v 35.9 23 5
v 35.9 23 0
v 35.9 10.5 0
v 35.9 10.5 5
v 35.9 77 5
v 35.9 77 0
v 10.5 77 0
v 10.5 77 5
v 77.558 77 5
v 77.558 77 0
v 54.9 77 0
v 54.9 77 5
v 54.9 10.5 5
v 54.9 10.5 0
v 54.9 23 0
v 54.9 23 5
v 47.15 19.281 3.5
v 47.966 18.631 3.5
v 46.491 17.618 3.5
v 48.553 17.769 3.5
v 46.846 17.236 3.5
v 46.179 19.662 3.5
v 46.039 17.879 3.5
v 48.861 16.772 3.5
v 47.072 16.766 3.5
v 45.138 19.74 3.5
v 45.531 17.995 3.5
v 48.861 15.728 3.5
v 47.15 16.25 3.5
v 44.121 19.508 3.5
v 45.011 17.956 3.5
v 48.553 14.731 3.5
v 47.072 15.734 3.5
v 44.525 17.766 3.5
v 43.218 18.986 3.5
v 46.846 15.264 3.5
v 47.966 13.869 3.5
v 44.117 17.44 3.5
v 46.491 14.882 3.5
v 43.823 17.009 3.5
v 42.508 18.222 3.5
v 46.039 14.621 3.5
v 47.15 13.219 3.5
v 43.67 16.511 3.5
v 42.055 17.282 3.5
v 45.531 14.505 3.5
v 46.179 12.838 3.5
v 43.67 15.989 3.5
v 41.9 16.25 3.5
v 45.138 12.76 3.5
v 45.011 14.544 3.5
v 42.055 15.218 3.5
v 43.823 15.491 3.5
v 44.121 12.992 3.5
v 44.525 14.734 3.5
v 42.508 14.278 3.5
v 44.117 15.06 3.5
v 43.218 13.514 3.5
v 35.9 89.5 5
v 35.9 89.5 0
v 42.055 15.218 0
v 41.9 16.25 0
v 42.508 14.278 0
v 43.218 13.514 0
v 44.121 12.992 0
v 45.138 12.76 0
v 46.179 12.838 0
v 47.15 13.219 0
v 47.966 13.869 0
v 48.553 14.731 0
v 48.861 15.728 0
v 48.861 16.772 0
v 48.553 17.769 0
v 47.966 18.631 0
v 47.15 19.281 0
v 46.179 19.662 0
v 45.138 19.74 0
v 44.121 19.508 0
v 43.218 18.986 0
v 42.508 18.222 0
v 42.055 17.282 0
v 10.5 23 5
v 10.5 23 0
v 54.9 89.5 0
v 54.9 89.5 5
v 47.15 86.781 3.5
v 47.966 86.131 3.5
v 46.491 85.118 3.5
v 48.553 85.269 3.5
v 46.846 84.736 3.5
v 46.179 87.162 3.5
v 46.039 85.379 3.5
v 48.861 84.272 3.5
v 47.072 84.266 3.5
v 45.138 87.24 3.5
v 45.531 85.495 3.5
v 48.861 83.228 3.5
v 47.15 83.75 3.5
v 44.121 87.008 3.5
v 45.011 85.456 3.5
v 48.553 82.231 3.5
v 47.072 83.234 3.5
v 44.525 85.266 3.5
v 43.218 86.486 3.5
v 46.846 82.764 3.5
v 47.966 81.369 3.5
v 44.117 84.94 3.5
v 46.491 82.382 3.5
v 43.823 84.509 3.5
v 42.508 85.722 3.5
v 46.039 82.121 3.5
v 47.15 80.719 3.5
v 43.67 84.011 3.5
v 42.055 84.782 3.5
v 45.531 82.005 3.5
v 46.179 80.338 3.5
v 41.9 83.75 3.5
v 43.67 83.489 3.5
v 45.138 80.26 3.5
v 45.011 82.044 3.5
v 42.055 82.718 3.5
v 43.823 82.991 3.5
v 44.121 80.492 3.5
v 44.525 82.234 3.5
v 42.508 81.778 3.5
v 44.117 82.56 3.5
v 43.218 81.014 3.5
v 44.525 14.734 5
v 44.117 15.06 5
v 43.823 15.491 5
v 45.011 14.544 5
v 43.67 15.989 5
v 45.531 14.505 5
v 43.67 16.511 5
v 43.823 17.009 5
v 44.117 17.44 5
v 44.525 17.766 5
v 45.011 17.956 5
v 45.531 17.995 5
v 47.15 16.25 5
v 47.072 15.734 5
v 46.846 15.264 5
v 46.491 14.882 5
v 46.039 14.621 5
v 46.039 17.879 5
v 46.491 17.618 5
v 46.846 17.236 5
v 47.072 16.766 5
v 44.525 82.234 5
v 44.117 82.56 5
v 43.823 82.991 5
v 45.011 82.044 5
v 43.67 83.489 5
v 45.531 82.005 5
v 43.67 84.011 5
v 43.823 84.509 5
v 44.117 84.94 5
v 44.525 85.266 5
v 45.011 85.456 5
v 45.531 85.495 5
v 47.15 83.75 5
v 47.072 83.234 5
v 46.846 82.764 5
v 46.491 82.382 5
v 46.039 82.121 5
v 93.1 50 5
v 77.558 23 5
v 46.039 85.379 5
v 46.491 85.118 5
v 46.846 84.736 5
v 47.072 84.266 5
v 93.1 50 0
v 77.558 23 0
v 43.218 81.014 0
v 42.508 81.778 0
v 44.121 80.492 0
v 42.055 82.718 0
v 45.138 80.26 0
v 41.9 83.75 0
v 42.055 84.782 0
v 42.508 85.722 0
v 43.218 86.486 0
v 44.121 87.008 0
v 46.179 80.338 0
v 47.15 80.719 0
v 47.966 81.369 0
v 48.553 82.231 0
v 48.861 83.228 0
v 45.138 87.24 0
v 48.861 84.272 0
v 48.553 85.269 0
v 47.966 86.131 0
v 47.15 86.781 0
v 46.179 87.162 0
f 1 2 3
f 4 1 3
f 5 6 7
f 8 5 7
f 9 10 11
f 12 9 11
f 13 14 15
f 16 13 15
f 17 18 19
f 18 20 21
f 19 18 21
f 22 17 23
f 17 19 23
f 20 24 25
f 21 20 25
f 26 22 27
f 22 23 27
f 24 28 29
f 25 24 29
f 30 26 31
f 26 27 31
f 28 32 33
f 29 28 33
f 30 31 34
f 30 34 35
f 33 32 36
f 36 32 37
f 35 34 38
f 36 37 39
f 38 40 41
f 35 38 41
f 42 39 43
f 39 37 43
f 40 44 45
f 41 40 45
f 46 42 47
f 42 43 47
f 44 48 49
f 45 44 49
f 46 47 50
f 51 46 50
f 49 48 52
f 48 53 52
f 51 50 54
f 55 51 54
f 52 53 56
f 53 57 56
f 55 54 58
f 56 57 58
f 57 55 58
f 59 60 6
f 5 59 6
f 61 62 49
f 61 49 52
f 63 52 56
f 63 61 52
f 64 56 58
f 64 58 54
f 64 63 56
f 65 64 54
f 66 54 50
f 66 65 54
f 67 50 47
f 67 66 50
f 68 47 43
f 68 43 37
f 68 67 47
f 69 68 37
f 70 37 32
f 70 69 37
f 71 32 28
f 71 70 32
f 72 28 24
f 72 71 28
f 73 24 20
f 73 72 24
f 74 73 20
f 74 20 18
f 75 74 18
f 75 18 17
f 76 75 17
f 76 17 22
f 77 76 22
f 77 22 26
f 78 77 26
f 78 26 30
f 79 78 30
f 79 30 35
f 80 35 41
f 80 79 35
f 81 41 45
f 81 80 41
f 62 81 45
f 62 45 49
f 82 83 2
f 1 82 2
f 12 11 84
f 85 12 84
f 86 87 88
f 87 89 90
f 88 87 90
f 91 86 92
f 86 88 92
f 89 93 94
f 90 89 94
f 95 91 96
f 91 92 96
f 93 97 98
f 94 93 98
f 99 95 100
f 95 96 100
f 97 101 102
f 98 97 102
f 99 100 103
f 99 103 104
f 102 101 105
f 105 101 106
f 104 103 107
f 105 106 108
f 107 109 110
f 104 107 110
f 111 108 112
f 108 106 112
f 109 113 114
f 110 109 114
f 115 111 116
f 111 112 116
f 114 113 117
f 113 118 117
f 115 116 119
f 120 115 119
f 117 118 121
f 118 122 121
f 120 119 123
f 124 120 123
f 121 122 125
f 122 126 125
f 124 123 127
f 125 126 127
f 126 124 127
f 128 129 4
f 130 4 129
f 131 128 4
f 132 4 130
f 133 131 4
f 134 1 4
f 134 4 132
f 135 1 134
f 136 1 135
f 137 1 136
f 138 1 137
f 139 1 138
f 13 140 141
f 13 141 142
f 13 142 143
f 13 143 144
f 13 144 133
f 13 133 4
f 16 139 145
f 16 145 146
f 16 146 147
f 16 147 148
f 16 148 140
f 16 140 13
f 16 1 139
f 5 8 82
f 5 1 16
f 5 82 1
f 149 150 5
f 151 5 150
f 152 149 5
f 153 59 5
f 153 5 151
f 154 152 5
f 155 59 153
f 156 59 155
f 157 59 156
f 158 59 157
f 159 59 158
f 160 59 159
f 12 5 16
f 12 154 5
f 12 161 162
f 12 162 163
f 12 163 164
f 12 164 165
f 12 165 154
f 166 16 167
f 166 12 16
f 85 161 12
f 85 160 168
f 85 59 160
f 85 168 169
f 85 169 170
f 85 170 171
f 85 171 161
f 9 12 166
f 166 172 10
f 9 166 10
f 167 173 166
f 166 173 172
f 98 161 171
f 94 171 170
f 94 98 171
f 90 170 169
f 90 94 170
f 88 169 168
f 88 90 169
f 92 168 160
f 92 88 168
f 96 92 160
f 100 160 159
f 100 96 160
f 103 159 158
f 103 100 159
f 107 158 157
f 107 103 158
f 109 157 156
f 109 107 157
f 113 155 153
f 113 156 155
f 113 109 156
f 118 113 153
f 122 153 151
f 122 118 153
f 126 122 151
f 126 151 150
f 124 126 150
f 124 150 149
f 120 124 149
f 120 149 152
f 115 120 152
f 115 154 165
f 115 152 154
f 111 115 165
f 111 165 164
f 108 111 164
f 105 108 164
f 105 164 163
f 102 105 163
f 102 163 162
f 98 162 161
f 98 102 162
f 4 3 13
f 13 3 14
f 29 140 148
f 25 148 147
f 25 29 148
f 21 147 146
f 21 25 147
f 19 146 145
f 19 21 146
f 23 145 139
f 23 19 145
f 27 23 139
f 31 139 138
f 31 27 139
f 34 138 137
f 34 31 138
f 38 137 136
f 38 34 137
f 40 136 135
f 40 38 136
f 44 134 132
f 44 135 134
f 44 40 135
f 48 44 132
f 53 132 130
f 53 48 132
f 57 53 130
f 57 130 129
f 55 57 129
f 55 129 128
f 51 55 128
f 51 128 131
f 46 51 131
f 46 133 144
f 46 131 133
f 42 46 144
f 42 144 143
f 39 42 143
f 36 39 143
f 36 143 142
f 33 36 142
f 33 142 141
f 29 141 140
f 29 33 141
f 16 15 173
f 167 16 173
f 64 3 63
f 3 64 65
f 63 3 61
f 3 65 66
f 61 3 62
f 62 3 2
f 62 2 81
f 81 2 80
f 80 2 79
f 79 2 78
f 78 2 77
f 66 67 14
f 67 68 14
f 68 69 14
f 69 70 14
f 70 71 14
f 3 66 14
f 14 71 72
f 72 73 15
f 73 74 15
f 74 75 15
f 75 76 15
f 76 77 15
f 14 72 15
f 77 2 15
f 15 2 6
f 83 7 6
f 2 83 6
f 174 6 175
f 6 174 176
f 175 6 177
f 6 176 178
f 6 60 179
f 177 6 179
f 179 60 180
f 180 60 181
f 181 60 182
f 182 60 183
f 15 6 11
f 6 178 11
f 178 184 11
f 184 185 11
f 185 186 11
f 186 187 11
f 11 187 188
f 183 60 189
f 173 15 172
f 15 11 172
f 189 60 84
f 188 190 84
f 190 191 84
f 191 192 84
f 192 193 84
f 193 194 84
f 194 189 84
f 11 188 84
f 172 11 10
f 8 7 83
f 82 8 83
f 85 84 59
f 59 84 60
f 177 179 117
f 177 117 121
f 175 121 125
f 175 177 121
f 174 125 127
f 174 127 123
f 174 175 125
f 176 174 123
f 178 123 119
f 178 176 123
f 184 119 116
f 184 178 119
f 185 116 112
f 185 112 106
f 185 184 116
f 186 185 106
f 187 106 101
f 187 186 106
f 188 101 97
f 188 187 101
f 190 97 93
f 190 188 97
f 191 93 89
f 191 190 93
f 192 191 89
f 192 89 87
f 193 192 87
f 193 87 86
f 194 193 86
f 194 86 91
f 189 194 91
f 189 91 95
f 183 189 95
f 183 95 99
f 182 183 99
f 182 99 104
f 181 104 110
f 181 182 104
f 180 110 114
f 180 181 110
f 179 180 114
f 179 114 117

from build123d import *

# Parameters (mm, degrees)
BOSS_EXTRUDE2_DEPTH     = 5
CUT_EXTRUDE6_DEPTH      = 131.001332273
CUT_EXTRUDE2_DEPTH      = 130.239475323
CUT_EXTRUDE2_DEPTH_BACK = 130.239475323
SKETCH2_R               = 1.75
SKETCH2_3_R             = 3.5
SKETCH2_3_R_2           = 1.75
CUT_EXTRUDE4_DEPTH      = 3.5


with BuildPart() as part:
    # Sketch1 → Boss-Extrude2 (new body)
    with BuildSketch(Plane.XY):
        Polygon((35.4, 77.5), (10, 77.5), (10, 22.5), (35.4, 22.5), (35.4, 10), (55.4, 10), (55.4, 22.5), (77.847550572, 22.5), (93.676818865, 50), (77.847550572, 77.5), (55.4, 77.5), (55.4, 90), (35.4, 90), align=None)
    extrude(amount=BOSS_EXTRUDE2_DEPTH)

    # Sketch6 → Cut-Extrude6 (cut, through all)
    with BuildSketch(Plane.XY):
        Polygon((55.4, 10), (55.4, 22.5), (77.847550572, 22.5), (93.676818865, 50), (77.847550572, 77.5), (55.4, 77.5), (55.4, 90), (35.4, 90), (35.4, 77.5), (10, 77.5), (10, 22.5), (35.4, 22.5), (35.4, 10), align=None)
        Polygon((77.558439817, 23), (54.9, 23), (54.9, 10.5), (35.9, 10.5), (35.9, 23), (10.5, 23), (10.5, 77), (35.9, 77), (35.9, 89.5), (54.9, 89.5), (54.9, 77), (77.558439817, 77), (93.099903232, 50), align=None, mode=Mode.SUBTRACT)
    extrude(amount=CUT_EXTRUDE6_DEPTH, mode=Mode.SUBTRACT)

    # Sketch2 → Cut-Extrude2 (cut, two sides: drawn at the far end of the back side and taken through both)
    with BuildSketch(Plane.XY.offset(-CUT_EXTRUDE2_DEPTH_BACK)):
        with Locations((45.4, 16.25)):
            Circle(SKETCH2_R)
        with Locations((45.4, 83.75)):
            Circle(SKETCH2_R)
    extrude(amount=CUT_EXTRUDE2_DEPTH + CUT_EXTRUDE2_DEPTH_BACK, mode=Mode.SUBTRACT)

    # Sketch2<3> → Cut-Extrude4 (cut)
    # profile 1 of 2: a face of its own
    with BuildSketch(Plane.XY):
        with Locations((45.4, 83.75)):
            Circle(SKETCH2_3_R)
        with Locations((45.4, 83.75)):
            Circle(SKETCH2_3_R_2, mode=Mode.SUBTRACT)
    # profile 2 of 2: a face of its own
    with BuildSketch(Plane.XY):
        with Locations((45.4, 16.25)):
            Circle(SKETCH2_3_R)
        with Locations((45.4, 16.25)):
            Circle(SKETCH2_3_R_2, mode=Mode.SUBTRACT)
    extrude(amount=CUT_EXTRUDE4_DEPTH, mode=Mode.SUBTRACT)


solid = part.part
